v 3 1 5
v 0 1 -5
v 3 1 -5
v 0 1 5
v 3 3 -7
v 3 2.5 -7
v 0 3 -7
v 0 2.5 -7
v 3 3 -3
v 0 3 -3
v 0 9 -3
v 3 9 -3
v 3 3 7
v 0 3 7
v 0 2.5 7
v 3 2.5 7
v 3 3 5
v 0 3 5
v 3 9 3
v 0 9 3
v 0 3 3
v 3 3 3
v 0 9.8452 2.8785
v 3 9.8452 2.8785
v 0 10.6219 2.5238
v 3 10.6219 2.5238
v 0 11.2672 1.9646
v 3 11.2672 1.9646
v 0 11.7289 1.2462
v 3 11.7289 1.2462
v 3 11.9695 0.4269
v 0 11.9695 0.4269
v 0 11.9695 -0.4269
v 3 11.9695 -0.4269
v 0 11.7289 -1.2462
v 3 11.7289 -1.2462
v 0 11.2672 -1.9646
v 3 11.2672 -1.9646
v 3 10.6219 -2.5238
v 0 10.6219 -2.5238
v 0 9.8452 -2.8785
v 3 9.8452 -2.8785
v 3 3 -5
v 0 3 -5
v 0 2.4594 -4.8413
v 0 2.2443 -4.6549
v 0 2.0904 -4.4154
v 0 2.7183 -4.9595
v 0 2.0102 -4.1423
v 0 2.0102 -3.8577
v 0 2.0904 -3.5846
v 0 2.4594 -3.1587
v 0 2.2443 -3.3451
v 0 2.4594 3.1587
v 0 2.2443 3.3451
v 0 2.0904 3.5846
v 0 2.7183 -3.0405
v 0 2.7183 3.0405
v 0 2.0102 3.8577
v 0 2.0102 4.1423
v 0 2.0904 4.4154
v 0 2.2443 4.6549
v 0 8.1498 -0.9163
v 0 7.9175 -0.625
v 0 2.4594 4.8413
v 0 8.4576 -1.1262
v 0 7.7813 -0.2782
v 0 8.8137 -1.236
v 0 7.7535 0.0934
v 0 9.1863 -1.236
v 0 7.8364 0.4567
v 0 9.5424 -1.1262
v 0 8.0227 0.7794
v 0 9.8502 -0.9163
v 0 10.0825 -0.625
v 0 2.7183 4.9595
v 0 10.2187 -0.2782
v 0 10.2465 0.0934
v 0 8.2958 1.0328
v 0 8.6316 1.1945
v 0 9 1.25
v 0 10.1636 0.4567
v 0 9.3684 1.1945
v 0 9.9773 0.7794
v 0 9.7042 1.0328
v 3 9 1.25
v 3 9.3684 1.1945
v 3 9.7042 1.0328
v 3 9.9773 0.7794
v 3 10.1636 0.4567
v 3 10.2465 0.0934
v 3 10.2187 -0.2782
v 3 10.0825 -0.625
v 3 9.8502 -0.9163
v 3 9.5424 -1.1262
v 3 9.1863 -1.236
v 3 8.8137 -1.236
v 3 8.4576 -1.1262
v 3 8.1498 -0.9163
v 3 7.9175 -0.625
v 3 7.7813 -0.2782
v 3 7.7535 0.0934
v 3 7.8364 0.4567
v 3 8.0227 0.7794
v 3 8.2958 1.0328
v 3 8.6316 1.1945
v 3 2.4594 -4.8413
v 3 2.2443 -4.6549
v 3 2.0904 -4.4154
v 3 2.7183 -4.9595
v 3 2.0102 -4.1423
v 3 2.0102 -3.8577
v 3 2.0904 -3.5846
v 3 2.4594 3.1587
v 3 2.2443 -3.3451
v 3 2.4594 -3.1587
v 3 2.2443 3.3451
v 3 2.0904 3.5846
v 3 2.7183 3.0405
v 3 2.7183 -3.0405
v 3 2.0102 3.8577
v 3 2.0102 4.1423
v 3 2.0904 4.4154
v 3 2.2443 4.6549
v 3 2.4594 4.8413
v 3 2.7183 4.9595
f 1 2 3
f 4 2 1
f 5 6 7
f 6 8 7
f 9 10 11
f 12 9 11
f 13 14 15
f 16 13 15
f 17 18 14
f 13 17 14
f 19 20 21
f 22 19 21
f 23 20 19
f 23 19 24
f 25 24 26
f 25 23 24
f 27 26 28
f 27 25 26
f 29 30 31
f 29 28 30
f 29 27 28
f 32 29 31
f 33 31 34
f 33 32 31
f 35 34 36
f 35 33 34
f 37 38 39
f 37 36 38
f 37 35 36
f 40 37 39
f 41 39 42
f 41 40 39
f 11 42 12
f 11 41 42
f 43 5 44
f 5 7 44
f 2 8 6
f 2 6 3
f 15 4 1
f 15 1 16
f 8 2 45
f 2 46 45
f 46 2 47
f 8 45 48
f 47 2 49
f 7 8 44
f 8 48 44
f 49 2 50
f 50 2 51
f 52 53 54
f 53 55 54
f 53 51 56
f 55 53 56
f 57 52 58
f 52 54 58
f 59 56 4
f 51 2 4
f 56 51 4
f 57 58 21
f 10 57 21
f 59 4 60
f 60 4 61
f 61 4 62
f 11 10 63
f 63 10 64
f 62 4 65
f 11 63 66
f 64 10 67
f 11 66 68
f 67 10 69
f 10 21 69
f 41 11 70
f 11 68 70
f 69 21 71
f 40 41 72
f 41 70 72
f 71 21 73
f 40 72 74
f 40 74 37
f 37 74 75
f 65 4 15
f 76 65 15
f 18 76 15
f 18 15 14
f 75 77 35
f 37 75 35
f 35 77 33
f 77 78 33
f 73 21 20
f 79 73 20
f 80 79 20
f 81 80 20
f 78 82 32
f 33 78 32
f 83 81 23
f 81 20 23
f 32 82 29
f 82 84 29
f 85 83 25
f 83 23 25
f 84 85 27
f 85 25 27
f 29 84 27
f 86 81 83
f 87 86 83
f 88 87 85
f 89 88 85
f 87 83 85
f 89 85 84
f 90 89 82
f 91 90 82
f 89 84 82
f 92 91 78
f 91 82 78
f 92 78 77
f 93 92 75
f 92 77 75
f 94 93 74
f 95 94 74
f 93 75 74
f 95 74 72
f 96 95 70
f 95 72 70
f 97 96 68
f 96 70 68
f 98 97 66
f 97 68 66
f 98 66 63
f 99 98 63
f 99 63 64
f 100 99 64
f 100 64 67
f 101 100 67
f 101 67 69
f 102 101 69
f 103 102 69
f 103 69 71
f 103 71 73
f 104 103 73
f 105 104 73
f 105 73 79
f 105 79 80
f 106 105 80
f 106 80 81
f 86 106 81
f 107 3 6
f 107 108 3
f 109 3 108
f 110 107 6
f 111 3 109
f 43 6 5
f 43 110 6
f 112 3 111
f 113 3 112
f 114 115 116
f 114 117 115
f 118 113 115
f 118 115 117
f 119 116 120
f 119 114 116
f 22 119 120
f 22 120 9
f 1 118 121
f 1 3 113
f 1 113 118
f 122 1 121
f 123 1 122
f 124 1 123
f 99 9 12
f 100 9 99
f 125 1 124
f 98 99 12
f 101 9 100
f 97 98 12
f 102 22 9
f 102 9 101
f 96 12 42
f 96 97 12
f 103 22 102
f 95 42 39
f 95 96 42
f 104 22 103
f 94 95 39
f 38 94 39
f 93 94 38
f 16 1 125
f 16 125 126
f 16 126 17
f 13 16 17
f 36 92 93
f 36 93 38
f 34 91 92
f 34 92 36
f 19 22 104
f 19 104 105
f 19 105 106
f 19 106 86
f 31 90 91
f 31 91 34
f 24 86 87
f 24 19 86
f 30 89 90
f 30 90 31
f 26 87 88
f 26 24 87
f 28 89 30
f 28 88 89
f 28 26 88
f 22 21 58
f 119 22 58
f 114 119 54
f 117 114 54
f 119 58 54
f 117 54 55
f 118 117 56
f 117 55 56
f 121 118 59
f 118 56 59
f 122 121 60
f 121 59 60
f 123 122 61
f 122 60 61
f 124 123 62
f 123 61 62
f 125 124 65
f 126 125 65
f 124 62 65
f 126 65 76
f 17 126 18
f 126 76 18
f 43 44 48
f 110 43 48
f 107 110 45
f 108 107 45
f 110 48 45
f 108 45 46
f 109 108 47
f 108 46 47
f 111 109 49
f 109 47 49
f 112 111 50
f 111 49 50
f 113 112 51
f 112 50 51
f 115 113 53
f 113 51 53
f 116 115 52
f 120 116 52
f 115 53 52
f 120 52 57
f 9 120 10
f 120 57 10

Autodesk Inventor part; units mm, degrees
ref_plane "YZ Plane" through (0, 0, 0) normal (1, 0, 0) x (0, 1, 0)
ref_plane "XZ Plane" through (0, 0, 0) normal (0, 1, 0) x (-1, 0, 0)
ref_plane "XY Plane" through (0, 0, 0) normal (0, 0, 1) x (1, 0, 0)
sketch "スケッチ1" plane through (0, 0, 0) normal (1, 0, 0) x (0, 1, 0)
  line L0 (9, 0) -> (-9, 0) construction
  line L1 (9, 3) -> (-9, 3)
  line L2 (-9, -3) -> (9, -3)
  arc A0 (9, -3) -> (9, 3) centre (9, 0) ccw
  arc A1 (-9, 3) -> (-9, -3) centre (-9, 0) ccw
  line L3 (3, 7) -> (-3, 7)
  line L4 (-3, -7) -> (3, -7)
  line L5 (3, 7) -> (-3, -7) construction
  line L6 (-3, 7) -> (3, -7) construction
  line L7 (-3, 7) -> (-3, 5)
  line L8 (3, 5) -> (3, 7)
  line L9 (3, -7) -> (3, -5)
  line L10 (3, -3) -> (3, 3)
  line L11 (-3, 3) -> (-3, -3)
  line L12 (-3, -5) -> (-3, -7)
  circle A2 centre (-9, 0) radius 1.25
  circle A3 centre (9, 0) radius 1.25
  line L13 (3, -5) -> (3, -3)
  line L14 (3, 3) -> (3, 5)
  line L15 (-3, 5) -> (-3, 3)
  line L16 (-3, -3) -> (-3, -5)
  point P0 (0, 0)
  dimension "d0" = 6
  dimension "d1" = 6
  dimension "d3" = 14
  dimension "d4" = 18
  dimension "d7" = 0
  dimension "d8" = 6
  dimension "d9" = 4
  dimension "d11" = 2.5
  dimension "d12" = 2.5
extrude "押し出し1" add sketch "スケッチ1" along normal blind 3 contours A0 L2 L10 L1 | L10 L2 L11 L1 | L1 L15 L7 L3 L8 L14 | L11 L2 A1 L1 | L13 L9 L4 L12 L16 L2 | A2 | A3
sketch "スケッチ2" plane through (0, 0, 0) normal (-1, 0, 0) x (0, 0, 1)
  circle A0 centre (0, 9) radius 1.25 projected
  circle A1 centre (0, -9) radius 1.25 projected
  line L0 (-3, 3) -> (-7, 3) projected
  line L1 (-7, 3) -> (-7, -3) projected
  line L2 (-7, -3) -> (-3, -3) projected
  line L3 (-3, -3) -> (-3, -9) projected
  arc A2 (-3, -9) -> (3, -9) centre (0, -9) ccw projected
  line L4 (3, -9) -> (3, -3) projected
  line L5 (3, -3) -> (7, -3) projected
  line L6 (7, -3) -> (7, 3) projected
  line L7 (7, 3) -> (3, 3) projected
  line L8 (3, 3) -> (3, 9) projected
  arc A3 (3, 9) -> (-3, 9) centre (0, 9) ccw projected
  line L9 (-3, 9) -> (-3, 3) projected
  line L10 (-7, 2.5) -> (-5, 1)
  line L11 (-5, 1) -> (5, 1)
  line L12 (5, 1) -> (7, 2.5)
  line L13 (3, 3) -> (3, 9) projected
  line L14 (-3, 9) -> (-3, 3) projected
  arc A4 (-5, 3) -> (-3, 3) centre (-4, 3) ccw
  arc A5 (3, 3) -> (5, 3) centre (4, 3) ccw
  point P0 (0, 0)
  point P1 (0, 1)
  dimension "d17" = 10
  dimension "d18" = 2
  dimension "d19" = 0.5
  dimension "d26" = 2
extrude "押し出し4" cut sketch "スケッチ2" against normal through all contours L9 A3 L8 A5 L7 L6 L12 L11 L10 L1 L0 A4 keep common part
properties part number "tip3" material "アルミニウム 2014-T4"
